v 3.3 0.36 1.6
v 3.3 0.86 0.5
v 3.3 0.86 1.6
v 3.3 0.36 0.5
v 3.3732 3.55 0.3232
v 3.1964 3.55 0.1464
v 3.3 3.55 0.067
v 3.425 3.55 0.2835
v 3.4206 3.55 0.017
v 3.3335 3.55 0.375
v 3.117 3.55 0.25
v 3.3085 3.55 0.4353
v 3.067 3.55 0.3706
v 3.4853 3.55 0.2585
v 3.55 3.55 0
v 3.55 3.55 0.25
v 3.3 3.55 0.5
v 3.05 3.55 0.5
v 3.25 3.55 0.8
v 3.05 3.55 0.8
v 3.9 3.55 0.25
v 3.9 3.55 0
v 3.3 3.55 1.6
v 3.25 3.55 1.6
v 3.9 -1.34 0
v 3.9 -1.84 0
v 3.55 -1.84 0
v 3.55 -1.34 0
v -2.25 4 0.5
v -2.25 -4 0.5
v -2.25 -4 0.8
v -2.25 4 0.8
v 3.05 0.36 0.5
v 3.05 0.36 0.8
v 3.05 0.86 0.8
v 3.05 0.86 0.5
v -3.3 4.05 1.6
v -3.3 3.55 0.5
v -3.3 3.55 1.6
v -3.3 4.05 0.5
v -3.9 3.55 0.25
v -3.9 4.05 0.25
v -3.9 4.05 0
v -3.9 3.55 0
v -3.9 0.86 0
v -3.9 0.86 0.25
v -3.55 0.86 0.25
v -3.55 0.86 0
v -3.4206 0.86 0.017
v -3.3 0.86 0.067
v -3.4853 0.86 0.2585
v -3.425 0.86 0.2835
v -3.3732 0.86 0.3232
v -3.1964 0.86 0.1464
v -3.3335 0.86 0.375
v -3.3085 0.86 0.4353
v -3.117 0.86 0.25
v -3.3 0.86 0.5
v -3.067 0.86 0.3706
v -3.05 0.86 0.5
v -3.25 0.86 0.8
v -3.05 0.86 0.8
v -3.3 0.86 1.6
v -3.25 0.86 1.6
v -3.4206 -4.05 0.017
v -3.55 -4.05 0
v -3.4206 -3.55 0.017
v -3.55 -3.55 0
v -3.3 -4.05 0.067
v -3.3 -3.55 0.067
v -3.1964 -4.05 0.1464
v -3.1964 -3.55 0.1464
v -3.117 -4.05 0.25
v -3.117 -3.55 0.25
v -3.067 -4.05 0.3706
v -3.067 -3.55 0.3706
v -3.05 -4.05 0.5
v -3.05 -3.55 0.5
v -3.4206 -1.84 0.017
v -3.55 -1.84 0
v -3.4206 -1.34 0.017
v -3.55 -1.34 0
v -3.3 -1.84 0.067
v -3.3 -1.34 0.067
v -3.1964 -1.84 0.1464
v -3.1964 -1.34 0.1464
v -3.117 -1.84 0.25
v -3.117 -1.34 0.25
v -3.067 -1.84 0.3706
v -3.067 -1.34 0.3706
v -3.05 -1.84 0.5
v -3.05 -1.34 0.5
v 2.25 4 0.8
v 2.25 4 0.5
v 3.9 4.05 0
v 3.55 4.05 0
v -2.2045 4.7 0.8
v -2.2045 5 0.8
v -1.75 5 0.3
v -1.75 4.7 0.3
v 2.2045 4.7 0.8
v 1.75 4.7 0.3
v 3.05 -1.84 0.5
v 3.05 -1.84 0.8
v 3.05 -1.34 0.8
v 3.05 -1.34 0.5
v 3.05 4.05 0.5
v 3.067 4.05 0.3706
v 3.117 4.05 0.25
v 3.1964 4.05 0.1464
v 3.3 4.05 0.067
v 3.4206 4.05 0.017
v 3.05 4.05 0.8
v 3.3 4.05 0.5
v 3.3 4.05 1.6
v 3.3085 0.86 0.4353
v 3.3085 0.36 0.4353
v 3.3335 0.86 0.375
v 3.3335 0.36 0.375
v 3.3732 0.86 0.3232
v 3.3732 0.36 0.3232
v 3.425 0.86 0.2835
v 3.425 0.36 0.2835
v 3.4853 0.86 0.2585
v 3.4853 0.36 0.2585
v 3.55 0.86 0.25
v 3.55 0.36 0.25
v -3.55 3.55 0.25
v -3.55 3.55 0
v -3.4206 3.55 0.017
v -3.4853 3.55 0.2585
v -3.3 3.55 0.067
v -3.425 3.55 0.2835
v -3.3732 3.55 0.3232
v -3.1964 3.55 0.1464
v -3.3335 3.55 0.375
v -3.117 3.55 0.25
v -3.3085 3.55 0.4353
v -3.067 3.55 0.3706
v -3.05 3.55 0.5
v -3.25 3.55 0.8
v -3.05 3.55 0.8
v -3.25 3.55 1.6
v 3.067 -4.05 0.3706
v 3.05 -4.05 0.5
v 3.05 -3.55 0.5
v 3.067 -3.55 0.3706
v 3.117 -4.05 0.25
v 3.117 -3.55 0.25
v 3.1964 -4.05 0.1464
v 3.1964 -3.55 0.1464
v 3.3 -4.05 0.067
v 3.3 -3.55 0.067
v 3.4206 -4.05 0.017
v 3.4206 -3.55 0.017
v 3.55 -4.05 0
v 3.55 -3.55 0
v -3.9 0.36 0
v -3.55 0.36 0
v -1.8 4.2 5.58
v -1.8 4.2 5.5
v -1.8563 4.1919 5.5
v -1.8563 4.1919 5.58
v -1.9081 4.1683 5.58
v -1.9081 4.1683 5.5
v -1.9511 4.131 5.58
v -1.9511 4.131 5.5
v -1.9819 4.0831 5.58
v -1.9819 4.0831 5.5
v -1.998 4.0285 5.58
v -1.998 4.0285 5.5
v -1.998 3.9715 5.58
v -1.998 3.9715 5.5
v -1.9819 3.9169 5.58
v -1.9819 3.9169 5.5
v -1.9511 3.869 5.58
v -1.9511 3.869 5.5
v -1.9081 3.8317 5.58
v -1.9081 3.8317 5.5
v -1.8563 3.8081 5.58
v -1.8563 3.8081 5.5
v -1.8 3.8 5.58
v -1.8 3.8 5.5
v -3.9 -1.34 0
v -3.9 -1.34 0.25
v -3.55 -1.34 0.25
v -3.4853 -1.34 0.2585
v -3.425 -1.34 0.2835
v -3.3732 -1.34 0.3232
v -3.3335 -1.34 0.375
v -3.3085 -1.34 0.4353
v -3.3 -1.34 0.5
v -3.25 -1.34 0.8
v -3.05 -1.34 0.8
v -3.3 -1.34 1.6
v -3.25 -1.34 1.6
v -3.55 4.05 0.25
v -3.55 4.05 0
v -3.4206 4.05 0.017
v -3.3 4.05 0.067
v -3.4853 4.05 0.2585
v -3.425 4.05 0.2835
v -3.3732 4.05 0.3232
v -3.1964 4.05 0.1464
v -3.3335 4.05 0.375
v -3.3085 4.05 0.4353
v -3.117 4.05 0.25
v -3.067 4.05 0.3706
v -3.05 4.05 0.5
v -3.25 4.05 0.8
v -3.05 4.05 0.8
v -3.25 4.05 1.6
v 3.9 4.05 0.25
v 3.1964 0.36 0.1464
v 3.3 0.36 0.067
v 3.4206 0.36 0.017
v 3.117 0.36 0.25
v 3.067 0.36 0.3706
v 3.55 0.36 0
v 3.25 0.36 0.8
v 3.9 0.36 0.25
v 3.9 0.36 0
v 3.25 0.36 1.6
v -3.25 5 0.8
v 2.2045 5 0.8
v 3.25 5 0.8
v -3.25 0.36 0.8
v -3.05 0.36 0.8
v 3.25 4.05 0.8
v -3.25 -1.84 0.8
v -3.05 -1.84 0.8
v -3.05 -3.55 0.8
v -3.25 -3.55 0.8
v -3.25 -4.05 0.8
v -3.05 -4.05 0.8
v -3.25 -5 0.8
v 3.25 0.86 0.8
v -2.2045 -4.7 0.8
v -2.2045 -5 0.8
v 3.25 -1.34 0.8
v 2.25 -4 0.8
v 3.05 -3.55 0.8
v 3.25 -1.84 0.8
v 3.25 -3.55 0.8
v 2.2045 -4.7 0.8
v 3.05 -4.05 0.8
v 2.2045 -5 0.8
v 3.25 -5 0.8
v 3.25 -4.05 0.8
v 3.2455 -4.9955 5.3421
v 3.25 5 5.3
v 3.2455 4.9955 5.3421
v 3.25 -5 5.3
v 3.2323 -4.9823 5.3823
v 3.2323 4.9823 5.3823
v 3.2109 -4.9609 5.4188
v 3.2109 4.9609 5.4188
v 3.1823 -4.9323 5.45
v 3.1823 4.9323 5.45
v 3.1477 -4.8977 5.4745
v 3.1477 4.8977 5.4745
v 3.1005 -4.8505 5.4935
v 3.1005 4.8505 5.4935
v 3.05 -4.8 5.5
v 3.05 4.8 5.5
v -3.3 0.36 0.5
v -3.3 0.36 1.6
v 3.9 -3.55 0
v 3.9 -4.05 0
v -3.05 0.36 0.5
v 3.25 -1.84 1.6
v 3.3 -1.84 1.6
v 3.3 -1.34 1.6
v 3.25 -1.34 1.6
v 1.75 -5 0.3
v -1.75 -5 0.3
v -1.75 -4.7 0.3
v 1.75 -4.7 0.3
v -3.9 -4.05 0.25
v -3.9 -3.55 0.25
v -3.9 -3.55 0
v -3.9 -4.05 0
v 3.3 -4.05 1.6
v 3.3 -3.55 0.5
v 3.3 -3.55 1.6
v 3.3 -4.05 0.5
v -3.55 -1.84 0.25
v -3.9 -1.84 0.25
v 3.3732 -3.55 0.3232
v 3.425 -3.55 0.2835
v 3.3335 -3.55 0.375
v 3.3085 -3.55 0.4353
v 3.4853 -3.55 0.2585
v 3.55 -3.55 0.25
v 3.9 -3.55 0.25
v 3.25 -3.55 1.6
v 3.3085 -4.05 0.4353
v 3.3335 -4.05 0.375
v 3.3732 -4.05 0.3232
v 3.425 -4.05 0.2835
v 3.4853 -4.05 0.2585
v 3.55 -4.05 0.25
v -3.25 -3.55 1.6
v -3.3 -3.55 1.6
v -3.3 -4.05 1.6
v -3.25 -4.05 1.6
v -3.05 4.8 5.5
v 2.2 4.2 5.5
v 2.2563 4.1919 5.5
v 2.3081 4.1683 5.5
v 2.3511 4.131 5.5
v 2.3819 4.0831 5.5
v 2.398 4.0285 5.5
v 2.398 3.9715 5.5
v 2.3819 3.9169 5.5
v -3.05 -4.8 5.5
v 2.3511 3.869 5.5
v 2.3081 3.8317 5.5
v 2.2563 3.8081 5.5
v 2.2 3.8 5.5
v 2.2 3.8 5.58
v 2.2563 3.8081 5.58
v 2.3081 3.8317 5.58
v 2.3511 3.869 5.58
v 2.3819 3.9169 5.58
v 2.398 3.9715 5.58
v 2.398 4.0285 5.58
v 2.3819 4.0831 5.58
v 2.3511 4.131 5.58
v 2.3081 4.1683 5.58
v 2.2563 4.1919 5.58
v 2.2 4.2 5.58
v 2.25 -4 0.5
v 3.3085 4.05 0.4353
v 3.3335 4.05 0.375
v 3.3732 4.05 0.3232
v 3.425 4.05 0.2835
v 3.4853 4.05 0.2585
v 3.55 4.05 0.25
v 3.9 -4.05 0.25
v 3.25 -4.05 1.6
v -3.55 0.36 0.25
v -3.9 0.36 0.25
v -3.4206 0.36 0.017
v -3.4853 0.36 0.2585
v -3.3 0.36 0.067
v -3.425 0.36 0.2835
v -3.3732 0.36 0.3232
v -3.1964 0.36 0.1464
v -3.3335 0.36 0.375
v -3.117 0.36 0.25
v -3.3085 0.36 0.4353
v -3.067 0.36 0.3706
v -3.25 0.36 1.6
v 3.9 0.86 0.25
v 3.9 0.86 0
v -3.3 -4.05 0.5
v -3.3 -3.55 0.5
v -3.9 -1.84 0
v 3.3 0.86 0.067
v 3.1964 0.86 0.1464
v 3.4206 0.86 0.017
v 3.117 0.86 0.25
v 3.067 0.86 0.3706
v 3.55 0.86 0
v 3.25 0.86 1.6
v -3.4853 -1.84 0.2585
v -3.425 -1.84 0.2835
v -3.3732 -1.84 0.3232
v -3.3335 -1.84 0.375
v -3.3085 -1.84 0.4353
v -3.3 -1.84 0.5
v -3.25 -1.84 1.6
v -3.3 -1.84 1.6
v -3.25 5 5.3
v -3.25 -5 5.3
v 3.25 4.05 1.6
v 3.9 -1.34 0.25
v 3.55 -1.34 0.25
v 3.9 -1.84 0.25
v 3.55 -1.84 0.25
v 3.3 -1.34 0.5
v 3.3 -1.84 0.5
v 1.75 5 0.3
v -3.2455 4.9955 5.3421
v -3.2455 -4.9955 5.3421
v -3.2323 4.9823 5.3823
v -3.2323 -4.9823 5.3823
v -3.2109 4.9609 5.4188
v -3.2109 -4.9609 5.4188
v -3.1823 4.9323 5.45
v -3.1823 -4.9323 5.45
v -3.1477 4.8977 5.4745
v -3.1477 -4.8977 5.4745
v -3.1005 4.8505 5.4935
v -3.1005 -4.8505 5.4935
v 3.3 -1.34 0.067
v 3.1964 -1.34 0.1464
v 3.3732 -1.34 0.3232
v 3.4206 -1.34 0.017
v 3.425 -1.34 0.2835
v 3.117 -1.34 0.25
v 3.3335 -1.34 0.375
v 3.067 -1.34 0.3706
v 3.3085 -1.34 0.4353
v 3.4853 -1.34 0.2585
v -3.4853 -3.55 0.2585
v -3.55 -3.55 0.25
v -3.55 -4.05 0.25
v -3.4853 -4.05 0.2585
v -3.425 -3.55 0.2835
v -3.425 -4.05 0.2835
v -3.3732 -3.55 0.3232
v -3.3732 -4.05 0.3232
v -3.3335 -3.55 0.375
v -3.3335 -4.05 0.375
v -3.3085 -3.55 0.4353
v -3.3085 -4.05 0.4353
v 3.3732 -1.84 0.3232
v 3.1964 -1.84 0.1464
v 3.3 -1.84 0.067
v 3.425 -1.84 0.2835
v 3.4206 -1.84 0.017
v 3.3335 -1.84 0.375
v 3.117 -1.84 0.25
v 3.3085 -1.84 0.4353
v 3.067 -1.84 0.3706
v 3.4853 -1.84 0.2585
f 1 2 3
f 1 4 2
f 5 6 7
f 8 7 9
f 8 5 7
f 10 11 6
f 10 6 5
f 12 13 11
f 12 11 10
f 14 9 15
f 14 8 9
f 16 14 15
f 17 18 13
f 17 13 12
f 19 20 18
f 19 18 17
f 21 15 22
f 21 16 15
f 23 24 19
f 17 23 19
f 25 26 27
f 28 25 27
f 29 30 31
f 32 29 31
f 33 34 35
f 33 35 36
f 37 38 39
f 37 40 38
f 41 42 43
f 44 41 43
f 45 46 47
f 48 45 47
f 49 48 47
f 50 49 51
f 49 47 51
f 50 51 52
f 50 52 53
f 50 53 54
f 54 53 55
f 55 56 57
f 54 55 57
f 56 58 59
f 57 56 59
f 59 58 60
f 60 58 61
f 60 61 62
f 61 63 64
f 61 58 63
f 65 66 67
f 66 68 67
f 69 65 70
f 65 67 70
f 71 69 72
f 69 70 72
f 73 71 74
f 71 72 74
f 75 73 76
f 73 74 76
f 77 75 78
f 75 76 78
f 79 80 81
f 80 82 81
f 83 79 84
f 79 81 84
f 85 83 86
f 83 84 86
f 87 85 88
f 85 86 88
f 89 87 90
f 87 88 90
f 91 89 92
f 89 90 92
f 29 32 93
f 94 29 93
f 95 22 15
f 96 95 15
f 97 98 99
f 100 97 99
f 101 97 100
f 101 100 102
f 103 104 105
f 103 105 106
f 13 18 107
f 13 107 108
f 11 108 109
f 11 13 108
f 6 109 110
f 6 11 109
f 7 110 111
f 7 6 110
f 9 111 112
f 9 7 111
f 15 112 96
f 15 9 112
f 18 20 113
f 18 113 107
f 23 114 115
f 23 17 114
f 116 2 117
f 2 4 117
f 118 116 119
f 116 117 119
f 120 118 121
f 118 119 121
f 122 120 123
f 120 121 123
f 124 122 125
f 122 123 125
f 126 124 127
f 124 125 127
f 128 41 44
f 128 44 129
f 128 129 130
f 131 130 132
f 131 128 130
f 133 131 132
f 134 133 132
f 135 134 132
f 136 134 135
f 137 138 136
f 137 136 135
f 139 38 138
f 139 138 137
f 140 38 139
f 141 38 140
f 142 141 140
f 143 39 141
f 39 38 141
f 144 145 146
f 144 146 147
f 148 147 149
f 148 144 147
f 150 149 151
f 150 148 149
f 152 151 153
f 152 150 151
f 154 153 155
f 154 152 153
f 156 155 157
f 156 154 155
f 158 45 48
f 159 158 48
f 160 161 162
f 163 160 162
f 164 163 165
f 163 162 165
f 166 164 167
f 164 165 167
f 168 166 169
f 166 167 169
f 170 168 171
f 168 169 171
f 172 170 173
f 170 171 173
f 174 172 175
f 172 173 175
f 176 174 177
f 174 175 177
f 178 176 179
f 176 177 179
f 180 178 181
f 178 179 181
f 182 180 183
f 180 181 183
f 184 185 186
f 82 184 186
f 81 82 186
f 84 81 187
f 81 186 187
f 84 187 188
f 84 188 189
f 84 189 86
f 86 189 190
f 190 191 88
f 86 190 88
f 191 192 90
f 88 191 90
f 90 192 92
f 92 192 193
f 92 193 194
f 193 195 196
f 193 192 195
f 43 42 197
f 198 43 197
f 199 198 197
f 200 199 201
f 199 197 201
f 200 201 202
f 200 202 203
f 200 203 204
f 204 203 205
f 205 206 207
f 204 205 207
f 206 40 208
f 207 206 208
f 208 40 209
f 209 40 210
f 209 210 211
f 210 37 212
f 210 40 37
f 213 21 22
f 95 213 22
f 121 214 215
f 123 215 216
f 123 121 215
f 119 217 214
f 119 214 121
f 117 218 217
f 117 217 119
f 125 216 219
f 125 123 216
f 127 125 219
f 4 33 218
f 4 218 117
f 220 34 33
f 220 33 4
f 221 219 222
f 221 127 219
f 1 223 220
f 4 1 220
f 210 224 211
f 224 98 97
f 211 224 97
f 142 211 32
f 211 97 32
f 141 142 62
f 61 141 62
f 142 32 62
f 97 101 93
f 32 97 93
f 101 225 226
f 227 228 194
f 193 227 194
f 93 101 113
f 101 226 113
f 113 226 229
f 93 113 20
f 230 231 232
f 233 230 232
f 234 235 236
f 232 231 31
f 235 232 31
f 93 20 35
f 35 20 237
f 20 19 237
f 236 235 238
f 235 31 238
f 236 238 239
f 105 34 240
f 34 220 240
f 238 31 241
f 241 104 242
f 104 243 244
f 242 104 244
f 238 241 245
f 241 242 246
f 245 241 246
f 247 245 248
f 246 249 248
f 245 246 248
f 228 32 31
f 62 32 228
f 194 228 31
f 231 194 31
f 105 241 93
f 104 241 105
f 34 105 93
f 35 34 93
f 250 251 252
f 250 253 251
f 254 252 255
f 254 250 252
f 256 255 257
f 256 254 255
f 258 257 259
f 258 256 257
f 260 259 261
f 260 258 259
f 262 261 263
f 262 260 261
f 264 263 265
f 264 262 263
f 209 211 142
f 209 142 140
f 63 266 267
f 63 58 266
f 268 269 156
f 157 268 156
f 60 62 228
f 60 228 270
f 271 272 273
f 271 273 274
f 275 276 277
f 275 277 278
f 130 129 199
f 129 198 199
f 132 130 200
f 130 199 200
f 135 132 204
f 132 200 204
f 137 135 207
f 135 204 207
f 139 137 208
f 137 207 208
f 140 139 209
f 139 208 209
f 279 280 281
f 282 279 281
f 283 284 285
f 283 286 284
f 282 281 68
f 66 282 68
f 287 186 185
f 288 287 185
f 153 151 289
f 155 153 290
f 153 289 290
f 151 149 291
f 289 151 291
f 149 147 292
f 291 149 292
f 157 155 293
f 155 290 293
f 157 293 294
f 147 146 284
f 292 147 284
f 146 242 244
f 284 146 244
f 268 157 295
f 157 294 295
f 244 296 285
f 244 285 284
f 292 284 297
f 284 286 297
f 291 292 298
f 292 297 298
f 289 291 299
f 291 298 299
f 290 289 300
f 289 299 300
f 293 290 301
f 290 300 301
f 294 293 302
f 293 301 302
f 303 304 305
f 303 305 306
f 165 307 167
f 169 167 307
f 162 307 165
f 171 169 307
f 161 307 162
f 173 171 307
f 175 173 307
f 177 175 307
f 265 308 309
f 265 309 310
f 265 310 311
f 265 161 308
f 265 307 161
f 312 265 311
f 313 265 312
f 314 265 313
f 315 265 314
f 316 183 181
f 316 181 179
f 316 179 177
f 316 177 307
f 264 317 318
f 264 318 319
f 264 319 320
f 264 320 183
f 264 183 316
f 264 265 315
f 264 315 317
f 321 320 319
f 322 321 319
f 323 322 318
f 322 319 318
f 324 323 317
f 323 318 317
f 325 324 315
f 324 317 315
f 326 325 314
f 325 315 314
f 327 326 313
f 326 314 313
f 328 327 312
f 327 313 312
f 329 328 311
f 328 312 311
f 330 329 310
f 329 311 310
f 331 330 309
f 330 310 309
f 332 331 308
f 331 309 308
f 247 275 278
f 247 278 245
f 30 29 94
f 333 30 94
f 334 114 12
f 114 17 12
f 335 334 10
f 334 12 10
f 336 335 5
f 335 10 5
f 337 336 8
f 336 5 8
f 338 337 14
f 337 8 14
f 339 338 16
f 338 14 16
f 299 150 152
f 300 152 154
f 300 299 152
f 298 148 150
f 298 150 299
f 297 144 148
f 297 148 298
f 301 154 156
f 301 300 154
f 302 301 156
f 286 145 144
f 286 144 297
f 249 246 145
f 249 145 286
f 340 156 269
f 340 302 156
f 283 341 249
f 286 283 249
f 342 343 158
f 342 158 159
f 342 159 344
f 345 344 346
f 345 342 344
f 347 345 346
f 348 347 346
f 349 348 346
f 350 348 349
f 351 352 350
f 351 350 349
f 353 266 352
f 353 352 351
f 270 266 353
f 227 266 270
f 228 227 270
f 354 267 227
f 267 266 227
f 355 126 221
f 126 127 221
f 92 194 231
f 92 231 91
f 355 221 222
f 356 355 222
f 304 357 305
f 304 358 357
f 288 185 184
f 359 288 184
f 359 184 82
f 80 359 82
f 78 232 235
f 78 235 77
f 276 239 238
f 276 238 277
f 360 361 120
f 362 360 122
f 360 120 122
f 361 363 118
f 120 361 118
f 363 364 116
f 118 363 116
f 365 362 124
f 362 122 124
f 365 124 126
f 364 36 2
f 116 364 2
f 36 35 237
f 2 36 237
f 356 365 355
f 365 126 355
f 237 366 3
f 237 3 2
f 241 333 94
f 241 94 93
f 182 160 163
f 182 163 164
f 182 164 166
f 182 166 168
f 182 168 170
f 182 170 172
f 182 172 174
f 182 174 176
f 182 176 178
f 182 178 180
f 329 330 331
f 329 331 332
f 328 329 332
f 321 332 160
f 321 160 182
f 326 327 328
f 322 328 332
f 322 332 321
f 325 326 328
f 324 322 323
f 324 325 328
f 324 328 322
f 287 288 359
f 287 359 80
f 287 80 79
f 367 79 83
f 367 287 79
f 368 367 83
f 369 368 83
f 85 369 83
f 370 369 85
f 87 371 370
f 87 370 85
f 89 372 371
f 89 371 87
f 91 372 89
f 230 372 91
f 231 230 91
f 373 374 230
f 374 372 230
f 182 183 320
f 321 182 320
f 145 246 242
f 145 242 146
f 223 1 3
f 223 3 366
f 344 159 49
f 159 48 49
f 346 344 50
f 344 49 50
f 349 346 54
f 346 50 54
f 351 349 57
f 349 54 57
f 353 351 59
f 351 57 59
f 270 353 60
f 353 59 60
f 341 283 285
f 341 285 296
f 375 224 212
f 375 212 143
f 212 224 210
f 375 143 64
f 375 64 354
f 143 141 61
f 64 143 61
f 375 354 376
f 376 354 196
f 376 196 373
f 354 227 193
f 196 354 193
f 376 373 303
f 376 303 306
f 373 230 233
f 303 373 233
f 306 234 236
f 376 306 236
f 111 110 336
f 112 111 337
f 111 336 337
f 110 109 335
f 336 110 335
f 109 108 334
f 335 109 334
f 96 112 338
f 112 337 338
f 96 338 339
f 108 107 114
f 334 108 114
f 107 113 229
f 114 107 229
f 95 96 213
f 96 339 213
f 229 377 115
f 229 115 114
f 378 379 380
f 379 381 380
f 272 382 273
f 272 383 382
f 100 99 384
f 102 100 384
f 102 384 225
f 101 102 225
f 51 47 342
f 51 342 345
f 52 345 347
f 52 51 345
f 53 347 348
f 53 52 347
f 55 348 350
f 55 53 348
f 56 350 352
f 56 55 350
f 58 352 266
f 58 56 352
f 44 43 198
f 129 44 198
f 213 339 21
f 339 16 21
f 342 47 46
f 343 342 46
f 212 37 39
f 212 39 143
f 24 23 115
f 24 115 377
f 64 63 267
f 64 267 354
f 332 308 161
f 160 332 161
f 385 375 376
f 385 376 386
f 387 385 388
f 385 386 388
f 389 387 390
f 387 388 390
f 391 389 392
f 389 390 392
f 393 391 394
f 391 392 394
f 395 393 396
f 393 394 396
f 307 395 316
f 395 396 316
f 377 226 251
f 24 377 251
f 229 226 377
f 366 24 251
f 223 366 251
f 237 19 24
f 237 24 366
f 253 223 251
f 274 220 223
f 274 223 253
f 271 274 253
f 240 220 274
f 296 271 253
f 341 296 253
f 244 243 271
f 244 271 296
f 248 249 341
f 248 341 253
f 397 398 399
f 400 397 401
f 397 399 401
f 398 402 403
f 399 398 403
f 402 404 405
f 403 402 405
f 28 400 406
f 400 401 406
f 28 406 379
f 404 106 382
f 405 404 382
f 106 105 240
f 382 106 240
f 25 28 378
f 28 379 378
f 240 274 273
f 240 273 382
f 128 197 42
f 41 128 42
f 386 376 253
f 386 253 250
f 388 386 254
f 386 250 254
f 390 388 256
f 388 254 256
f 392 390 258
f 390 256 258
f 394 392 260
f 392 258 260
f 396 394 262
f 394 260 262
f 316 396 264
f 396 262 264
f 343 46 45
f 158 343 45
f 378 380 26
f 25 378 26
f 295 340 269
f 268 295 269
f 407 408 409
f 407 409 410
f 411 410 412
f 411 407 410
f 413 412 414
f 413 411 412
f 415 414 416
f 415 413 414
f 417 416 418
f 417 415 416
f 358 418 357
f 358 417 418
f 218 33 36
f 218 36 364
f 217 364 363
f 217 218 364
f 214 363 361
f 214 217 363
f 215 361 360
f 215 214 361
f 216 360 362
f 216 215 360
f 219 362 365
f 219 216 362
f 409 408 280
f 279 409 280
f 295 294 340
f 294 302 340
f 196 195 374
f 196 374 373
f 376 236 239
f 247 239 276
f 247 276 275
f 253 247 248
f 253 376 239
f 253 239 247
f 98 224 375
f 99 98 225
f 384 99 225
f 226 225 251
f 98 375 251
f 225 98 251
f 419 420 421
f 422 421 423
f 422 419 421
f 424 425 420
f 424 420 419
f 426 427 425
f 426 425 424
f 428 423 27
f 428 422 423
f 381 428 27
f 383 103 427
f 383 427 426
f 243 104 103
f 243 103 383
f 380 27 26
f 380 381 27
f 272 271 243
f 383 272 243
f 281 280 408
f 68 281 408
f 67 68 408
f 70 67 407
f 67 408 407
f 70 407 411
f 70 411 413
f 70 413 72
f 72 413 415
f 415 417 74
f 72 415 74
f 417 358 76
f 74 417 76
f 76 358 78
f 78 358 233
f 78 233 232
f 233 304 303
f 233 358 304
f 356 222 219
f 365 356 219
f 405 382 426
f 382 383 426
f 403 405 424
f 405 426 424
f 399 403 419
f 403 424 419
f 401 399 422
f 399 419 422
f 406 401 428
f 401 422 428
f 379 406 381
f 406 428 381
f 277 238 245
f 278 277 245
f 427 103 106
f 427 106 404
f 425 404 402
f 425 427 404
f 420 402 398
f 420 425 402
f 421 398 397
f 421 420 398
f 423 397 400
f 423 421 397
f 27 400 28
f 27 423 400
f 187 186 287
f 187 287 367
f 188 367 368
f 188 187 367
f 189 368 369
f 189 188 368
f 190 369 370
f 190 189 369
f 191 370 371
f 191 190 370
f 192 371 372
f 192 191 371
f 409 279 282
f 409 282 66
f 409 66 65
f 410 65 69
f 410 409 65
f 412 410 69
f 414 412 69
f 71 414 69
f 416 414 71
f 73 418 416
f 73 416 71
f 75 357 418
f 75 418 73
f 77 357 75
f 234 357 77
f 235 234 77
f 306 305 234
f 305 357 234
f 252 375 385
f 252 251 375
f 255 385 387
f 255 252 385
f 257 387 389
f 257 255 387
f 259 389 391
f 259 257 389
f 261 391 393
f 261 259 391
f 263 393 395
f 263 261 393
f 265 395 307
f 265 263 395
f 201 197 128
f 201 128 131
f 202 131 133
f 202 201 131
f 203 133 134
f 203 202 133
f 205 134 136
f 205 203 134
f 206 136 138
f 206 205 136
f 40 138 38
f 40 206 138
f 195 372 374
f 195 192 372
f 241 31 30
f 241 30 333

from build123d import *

# Parameters (mm, degrees)
PAD004_DEPTH = 0.25
PAD003_DEPTH = 0.25
PAD005_DEPTH = 0.25
PAD008_DEPTH = 0.3
SKETCH008_W  = 4.5
SKETCH008_H  = 0.35
PAD006_DEPTH = 4
PAD001_DEPTH = 0.18
PAD002_DEPTH = 0.25
PAD007_DEPTH = 0.3
SKETCH_W     = 10
SKETCH_H     = 6.5
PAD_DEPTH    = 4.7
POCKET_DEPTH = 0.5
FILLET_R     = 0.2


with BuildPart() as pad004:
    # Sketch006 → Pad004 (new body, symmetric)
    with BuildSketch(Plane.XZ.offset(-3.8)):
        with BuildLine():
            Line((-3.9, 0), (-3.549998, 0))
            ThreePointArc((-3.549998, 0), (-3.196446, 0.146447), (-3.05, 0.5))
            Line((-3.05, 1.6), (-3.05, 0.5))
            Line((-3.3, 1.6), (-3.05, 1.6))
            Line((-3.3, 0.499998), (-3.3, 1.6))
            ThreePointArc((-3.549998, 0.25), (-3.373223, 0.323223), (-3.3, 0.499998))
            Line((-3.549998, 0.25), (-3.9, 0.25))
            Line((-3.9, 0.25), (-3.9, 0))
        make_face()
        with BuildLine():
            Line((3.3, 1.6), (3.05, 1.6))
            Line((3.05, 1.6), (3.05, 0.500004))
            ThreePointArc((3.05, 0.500004), (3.196444, 0.146448), (3.549998, 0))
            Line((3.9, 0), (3.549998, 0))
            Line((3.9, 0.25), (3.9, 0))
            Line((3.549998, 0.25), (3.9, 0.25))
            ThreePointArc((3.3, 0.499998), (3.373223, 0.323223), (3.549998, 0.25))
            Line((3.3, 0.499998), (3.3, 1.6))
        make_face()
    extrude(amount=PAD004_DEPTH, both=True)


with BuildPart() as pad003:
    # Sketch005 → Pad003 (new body, symmetric)
    with BuildSketch(Plane.XZ.offset(3.8)):
        with BuildLine():
            Line((-3.9, 0), (-3.549998, 0))
            ThreePointArc((-3.549998, 0), (-3.196446, 0.146447), (-3.05, 0.5))
            Line((-3.05, 1.6), (-3.05, 0.5))
            Line((-3.3, 1.6), (-3.05, 1.6))
            Line((-3.3, 0.499998), (-3.3, 1.6))
            ThreePointArc((-3.549998, 0.25), (-3.373223, 0.323223), (-3.3, 0.499998))
            Line((-3.549998, 0.25), (-3.9, 0.25))
            Line((-3.9, 0.25), (-3.9, 0))
        make_face()
        with BuildLine():
            Line((3.3, 1.6), (3.05, 1.6))
            Line((3.05, 1.6), (3.05, 0.500004))
            ThreePointArc((3.05, 0.500004), (3.196444, 0.146448), (3.549998, 0))
            Line((3.9, 0), (3.549998, 0))
            Line((3.9, 0.25), (3.9, 0))
            Line((3.549998, 0.25), (3.9, 0.25))
            ThreePointArc((3.3, 0.499998), (3.373223, 0.323223), (3.549998, 0.25))
            Line((3.3, 0.499998), (3.3, 1.6))
        make_face()
    extrude(amount=PAD003_DEPTH, both=True)


with BuildPart() as pad005:
    # Sketch007 → Pad005 (new body, symmetric)
    with BuildSketch(Plane.XZ.offset(-0.61)):
        with BuildLine():
            Line((-3.9, 0), (-3.549998, 0))
            ThreePointArc((-3.549998, 0), (-3.196446, 0.146447), (-3.05, 0.5))
            Line((-3.05, 1.6), (-3.05, 0.5))
            Line((-3.3, 1.6), (-3.05, 1.6))
            Line((-3.3, 0.499998), (-3.3, 1.6))
            ThreePointArc((-3.549998, 0.25), (-3.373223, 0.323223), (-3.3, 0.499998))
            Line((-3.549998, 0.25), (-3.9, 0.25))
            Line((-3.9, 0.25), (-3.9, 0))
        make_face()
        with BuildLine():
            Line((3.3, 1.6), (3.05, 1.6))
            Line((3.05, 1.6), (3.05, 0.500004))
            ThreePointArc((3.05, 0.500004), (3.196444, 0.146448), (3.549998, 0))
            Line((3.9, 0), (3.549998, 0))
            Line((3.9, 0.25), (3.9, 0))
            Line((3.549998, 0.25), (3.9, 0.25))
            ThreePointArc((3.3, 0.499998), (3.373223, 0.323223), (3.549998, 0.25))
            Line((3.3, 0.499998), (3.3, 1.6))
        make_face()
    extrude(amount=PAD005_DEPTH, both=True)


with BuildPart() as pad008:
    # Sketch010 → Pad008 (new body)
    with BuildSketch(Plane.XZ.offset(-5)):
        Polygon((-1.75, 0.3), (1.75, 0.3), (2.25, 0.85), (-2.25, 0.85), align=None)
    extrude(amount=PAD008_DEPTH)


with BuildPart() as pad006:
    # Sketch008 → Pad006 (new body, symmetric)
    with BuildSketch(Plane.XZ):
        with Locations((0, 0.675)):
            Rectangle(SKETCH008_W, SKETCH008_H)
    extrude(amount=PAD006_DEPTH, both=True)


with BuildPart() as pad001:
    # Sketch001 → Pad001 (new body)
    with BuildSketch(Plane(origin=(0, 0, 5.4), x_dir=(0, -1, 0), z_dir=(0, 0, 1))):
        with BuildLine():
            Line((-3.8, -1.8), (-3.8, 2.2))
            ThreePointArc((-3.8, 2.2), (-4, 2.4), (-4.2, 2.2))
            Line((-4.2, 2.2), (-4.2, -1.8))
            ThreePointArc((-4.2, -1.8), (-4, -2), (-3.8, -1.8))
        make_face()
    extrude(amount=PAD001_DEPTH)


with BuildPart() as pad002:
    # Sketch004 → Pad002 (new body, symmetric)
    with BuildSketch(Plane.XZ.offset(1.59)):
        with BuildLine():
            Line((-3.9, 0), (-3.549998, 0))
            ThreePointArc((-3.549998, 0), (-3.196446, 0.146447), (-3.05, 0.5))
            Line((-3.05, 1.6), (-3.05, 0.5))
            Line((-3.3, 1.6), (-3.05, 1.6))
            Line((-3.3, 0.499998), (-3.3, 1.6))
            ThreePointArc((-3.549998, 0.25), (-3.373223, 0.323223), (-3.3, 0.499998))
            Line((-3.549998, 0.25), (-3.9, 0.25))
            Line((-3.9, 0.25), (-3.9, 0))
        make_face()
        with BuildLine():
            Line((3.3, 1.6), (3.05, 1.6))
            Line((3.05, 1.6), (3.05, 0.500004))
            ThreePointArc((3.05, 0.500004), (3.196444, 0.146448), (3.549998, 0))
            Line((3.9, 0), (3.549998, 0))
            Line((3.9, 0.25), (3.9, 0))
            Line((3.549998, 0.25), (3.9, 0.25))
            ThreePointArc((3.3, 0.499998), (3.373223, 0.323223), (3.549998, 0.25))
            Line((3.3, 0.499998), (3.3, 1.6))
        make_face()
    extrude(amount=PAD002_DEPTH, both=True)


with BuildPart() as pad007:
    # Sketch009 → Pad007 (new body)
    with BuildSketch(Plane.XZ.offset(5)):
        Polygon((-1.75, 0.3), (1.75, 0.3), (2.25, 0.85), (-2.25, 0.85), align=None)
    extrude(amount=-PAD007_DEPTH)


with BuildPart() as relay_dpdt_omron_g6k_2f_y:
    # Sketch → Pad (new body)
    with BuildSketch(Plane(origin=(0, 0, 0.8), x_dir=(0, -1, 0), z_dir=(0, 0, 1))):
        Rectangle(SKETCH_W, SKETCH_H)
    extrude(amount=PAD_DEPTH)

    # Sketch003 → Pocket (cut)
    with BuildSketch(Plane(origin=(0, 0, 5.5), x_dir=(0, -1, 0), z_dir=(0, 0, 1))):
        with BuildLine():
            ThreePointArc((-0.318267, 7.6), (0.223846, 7.813173), (0.45, 8.35))
            Line((0.45, 8.35), (-2.05, 8.35))
            Line((-2.05, 8.35), (-2.05, 7.6))
            Line((-2.05, 7.6), (-0.318267, 7.6))
        make_face()
        with BuildLine():
            Line((9.6, -0.75), (12.1, -0.75))
            Line((12.1, -0.75), (12.1, 0))
            Line((10.285847, 0), (12.1, 0))
            ThreePointArc((10.285847, 0), (9.797313, -0.241845), (9.6, -0.75))
        make_face()
    extrude(amount=-POCKET_DEPTH, mode=Mode.SUBTRACT)

    # Fillet
    fillet_edges = [relay_dpdt_omron_g6k_2f_y.edges().sort_by_distance(p)[0] for p in [
        (-3.25, 0, 5.5),
        (0, -5, 5.5),
        (3.25, 0, 5.5),
        (0, 5, 5.5),
    ]]
    fillet(fillet_edges, radius=FILLET_R)

    # Fillet_mp_cp: union Pad004, Pad003, Pad005, Pad008, Pad006, Pad001, Pad002, Pad007
    add(pad004.part)
    add(pad003.part)
    add(pad005.part)
    add(pad008.part)
    add(pad006.part)
    add(pad001.part)
    add(pad002.part)
    add(pad007.part)


solid = relay_dpdt_omron_g6k_2f_y.part
